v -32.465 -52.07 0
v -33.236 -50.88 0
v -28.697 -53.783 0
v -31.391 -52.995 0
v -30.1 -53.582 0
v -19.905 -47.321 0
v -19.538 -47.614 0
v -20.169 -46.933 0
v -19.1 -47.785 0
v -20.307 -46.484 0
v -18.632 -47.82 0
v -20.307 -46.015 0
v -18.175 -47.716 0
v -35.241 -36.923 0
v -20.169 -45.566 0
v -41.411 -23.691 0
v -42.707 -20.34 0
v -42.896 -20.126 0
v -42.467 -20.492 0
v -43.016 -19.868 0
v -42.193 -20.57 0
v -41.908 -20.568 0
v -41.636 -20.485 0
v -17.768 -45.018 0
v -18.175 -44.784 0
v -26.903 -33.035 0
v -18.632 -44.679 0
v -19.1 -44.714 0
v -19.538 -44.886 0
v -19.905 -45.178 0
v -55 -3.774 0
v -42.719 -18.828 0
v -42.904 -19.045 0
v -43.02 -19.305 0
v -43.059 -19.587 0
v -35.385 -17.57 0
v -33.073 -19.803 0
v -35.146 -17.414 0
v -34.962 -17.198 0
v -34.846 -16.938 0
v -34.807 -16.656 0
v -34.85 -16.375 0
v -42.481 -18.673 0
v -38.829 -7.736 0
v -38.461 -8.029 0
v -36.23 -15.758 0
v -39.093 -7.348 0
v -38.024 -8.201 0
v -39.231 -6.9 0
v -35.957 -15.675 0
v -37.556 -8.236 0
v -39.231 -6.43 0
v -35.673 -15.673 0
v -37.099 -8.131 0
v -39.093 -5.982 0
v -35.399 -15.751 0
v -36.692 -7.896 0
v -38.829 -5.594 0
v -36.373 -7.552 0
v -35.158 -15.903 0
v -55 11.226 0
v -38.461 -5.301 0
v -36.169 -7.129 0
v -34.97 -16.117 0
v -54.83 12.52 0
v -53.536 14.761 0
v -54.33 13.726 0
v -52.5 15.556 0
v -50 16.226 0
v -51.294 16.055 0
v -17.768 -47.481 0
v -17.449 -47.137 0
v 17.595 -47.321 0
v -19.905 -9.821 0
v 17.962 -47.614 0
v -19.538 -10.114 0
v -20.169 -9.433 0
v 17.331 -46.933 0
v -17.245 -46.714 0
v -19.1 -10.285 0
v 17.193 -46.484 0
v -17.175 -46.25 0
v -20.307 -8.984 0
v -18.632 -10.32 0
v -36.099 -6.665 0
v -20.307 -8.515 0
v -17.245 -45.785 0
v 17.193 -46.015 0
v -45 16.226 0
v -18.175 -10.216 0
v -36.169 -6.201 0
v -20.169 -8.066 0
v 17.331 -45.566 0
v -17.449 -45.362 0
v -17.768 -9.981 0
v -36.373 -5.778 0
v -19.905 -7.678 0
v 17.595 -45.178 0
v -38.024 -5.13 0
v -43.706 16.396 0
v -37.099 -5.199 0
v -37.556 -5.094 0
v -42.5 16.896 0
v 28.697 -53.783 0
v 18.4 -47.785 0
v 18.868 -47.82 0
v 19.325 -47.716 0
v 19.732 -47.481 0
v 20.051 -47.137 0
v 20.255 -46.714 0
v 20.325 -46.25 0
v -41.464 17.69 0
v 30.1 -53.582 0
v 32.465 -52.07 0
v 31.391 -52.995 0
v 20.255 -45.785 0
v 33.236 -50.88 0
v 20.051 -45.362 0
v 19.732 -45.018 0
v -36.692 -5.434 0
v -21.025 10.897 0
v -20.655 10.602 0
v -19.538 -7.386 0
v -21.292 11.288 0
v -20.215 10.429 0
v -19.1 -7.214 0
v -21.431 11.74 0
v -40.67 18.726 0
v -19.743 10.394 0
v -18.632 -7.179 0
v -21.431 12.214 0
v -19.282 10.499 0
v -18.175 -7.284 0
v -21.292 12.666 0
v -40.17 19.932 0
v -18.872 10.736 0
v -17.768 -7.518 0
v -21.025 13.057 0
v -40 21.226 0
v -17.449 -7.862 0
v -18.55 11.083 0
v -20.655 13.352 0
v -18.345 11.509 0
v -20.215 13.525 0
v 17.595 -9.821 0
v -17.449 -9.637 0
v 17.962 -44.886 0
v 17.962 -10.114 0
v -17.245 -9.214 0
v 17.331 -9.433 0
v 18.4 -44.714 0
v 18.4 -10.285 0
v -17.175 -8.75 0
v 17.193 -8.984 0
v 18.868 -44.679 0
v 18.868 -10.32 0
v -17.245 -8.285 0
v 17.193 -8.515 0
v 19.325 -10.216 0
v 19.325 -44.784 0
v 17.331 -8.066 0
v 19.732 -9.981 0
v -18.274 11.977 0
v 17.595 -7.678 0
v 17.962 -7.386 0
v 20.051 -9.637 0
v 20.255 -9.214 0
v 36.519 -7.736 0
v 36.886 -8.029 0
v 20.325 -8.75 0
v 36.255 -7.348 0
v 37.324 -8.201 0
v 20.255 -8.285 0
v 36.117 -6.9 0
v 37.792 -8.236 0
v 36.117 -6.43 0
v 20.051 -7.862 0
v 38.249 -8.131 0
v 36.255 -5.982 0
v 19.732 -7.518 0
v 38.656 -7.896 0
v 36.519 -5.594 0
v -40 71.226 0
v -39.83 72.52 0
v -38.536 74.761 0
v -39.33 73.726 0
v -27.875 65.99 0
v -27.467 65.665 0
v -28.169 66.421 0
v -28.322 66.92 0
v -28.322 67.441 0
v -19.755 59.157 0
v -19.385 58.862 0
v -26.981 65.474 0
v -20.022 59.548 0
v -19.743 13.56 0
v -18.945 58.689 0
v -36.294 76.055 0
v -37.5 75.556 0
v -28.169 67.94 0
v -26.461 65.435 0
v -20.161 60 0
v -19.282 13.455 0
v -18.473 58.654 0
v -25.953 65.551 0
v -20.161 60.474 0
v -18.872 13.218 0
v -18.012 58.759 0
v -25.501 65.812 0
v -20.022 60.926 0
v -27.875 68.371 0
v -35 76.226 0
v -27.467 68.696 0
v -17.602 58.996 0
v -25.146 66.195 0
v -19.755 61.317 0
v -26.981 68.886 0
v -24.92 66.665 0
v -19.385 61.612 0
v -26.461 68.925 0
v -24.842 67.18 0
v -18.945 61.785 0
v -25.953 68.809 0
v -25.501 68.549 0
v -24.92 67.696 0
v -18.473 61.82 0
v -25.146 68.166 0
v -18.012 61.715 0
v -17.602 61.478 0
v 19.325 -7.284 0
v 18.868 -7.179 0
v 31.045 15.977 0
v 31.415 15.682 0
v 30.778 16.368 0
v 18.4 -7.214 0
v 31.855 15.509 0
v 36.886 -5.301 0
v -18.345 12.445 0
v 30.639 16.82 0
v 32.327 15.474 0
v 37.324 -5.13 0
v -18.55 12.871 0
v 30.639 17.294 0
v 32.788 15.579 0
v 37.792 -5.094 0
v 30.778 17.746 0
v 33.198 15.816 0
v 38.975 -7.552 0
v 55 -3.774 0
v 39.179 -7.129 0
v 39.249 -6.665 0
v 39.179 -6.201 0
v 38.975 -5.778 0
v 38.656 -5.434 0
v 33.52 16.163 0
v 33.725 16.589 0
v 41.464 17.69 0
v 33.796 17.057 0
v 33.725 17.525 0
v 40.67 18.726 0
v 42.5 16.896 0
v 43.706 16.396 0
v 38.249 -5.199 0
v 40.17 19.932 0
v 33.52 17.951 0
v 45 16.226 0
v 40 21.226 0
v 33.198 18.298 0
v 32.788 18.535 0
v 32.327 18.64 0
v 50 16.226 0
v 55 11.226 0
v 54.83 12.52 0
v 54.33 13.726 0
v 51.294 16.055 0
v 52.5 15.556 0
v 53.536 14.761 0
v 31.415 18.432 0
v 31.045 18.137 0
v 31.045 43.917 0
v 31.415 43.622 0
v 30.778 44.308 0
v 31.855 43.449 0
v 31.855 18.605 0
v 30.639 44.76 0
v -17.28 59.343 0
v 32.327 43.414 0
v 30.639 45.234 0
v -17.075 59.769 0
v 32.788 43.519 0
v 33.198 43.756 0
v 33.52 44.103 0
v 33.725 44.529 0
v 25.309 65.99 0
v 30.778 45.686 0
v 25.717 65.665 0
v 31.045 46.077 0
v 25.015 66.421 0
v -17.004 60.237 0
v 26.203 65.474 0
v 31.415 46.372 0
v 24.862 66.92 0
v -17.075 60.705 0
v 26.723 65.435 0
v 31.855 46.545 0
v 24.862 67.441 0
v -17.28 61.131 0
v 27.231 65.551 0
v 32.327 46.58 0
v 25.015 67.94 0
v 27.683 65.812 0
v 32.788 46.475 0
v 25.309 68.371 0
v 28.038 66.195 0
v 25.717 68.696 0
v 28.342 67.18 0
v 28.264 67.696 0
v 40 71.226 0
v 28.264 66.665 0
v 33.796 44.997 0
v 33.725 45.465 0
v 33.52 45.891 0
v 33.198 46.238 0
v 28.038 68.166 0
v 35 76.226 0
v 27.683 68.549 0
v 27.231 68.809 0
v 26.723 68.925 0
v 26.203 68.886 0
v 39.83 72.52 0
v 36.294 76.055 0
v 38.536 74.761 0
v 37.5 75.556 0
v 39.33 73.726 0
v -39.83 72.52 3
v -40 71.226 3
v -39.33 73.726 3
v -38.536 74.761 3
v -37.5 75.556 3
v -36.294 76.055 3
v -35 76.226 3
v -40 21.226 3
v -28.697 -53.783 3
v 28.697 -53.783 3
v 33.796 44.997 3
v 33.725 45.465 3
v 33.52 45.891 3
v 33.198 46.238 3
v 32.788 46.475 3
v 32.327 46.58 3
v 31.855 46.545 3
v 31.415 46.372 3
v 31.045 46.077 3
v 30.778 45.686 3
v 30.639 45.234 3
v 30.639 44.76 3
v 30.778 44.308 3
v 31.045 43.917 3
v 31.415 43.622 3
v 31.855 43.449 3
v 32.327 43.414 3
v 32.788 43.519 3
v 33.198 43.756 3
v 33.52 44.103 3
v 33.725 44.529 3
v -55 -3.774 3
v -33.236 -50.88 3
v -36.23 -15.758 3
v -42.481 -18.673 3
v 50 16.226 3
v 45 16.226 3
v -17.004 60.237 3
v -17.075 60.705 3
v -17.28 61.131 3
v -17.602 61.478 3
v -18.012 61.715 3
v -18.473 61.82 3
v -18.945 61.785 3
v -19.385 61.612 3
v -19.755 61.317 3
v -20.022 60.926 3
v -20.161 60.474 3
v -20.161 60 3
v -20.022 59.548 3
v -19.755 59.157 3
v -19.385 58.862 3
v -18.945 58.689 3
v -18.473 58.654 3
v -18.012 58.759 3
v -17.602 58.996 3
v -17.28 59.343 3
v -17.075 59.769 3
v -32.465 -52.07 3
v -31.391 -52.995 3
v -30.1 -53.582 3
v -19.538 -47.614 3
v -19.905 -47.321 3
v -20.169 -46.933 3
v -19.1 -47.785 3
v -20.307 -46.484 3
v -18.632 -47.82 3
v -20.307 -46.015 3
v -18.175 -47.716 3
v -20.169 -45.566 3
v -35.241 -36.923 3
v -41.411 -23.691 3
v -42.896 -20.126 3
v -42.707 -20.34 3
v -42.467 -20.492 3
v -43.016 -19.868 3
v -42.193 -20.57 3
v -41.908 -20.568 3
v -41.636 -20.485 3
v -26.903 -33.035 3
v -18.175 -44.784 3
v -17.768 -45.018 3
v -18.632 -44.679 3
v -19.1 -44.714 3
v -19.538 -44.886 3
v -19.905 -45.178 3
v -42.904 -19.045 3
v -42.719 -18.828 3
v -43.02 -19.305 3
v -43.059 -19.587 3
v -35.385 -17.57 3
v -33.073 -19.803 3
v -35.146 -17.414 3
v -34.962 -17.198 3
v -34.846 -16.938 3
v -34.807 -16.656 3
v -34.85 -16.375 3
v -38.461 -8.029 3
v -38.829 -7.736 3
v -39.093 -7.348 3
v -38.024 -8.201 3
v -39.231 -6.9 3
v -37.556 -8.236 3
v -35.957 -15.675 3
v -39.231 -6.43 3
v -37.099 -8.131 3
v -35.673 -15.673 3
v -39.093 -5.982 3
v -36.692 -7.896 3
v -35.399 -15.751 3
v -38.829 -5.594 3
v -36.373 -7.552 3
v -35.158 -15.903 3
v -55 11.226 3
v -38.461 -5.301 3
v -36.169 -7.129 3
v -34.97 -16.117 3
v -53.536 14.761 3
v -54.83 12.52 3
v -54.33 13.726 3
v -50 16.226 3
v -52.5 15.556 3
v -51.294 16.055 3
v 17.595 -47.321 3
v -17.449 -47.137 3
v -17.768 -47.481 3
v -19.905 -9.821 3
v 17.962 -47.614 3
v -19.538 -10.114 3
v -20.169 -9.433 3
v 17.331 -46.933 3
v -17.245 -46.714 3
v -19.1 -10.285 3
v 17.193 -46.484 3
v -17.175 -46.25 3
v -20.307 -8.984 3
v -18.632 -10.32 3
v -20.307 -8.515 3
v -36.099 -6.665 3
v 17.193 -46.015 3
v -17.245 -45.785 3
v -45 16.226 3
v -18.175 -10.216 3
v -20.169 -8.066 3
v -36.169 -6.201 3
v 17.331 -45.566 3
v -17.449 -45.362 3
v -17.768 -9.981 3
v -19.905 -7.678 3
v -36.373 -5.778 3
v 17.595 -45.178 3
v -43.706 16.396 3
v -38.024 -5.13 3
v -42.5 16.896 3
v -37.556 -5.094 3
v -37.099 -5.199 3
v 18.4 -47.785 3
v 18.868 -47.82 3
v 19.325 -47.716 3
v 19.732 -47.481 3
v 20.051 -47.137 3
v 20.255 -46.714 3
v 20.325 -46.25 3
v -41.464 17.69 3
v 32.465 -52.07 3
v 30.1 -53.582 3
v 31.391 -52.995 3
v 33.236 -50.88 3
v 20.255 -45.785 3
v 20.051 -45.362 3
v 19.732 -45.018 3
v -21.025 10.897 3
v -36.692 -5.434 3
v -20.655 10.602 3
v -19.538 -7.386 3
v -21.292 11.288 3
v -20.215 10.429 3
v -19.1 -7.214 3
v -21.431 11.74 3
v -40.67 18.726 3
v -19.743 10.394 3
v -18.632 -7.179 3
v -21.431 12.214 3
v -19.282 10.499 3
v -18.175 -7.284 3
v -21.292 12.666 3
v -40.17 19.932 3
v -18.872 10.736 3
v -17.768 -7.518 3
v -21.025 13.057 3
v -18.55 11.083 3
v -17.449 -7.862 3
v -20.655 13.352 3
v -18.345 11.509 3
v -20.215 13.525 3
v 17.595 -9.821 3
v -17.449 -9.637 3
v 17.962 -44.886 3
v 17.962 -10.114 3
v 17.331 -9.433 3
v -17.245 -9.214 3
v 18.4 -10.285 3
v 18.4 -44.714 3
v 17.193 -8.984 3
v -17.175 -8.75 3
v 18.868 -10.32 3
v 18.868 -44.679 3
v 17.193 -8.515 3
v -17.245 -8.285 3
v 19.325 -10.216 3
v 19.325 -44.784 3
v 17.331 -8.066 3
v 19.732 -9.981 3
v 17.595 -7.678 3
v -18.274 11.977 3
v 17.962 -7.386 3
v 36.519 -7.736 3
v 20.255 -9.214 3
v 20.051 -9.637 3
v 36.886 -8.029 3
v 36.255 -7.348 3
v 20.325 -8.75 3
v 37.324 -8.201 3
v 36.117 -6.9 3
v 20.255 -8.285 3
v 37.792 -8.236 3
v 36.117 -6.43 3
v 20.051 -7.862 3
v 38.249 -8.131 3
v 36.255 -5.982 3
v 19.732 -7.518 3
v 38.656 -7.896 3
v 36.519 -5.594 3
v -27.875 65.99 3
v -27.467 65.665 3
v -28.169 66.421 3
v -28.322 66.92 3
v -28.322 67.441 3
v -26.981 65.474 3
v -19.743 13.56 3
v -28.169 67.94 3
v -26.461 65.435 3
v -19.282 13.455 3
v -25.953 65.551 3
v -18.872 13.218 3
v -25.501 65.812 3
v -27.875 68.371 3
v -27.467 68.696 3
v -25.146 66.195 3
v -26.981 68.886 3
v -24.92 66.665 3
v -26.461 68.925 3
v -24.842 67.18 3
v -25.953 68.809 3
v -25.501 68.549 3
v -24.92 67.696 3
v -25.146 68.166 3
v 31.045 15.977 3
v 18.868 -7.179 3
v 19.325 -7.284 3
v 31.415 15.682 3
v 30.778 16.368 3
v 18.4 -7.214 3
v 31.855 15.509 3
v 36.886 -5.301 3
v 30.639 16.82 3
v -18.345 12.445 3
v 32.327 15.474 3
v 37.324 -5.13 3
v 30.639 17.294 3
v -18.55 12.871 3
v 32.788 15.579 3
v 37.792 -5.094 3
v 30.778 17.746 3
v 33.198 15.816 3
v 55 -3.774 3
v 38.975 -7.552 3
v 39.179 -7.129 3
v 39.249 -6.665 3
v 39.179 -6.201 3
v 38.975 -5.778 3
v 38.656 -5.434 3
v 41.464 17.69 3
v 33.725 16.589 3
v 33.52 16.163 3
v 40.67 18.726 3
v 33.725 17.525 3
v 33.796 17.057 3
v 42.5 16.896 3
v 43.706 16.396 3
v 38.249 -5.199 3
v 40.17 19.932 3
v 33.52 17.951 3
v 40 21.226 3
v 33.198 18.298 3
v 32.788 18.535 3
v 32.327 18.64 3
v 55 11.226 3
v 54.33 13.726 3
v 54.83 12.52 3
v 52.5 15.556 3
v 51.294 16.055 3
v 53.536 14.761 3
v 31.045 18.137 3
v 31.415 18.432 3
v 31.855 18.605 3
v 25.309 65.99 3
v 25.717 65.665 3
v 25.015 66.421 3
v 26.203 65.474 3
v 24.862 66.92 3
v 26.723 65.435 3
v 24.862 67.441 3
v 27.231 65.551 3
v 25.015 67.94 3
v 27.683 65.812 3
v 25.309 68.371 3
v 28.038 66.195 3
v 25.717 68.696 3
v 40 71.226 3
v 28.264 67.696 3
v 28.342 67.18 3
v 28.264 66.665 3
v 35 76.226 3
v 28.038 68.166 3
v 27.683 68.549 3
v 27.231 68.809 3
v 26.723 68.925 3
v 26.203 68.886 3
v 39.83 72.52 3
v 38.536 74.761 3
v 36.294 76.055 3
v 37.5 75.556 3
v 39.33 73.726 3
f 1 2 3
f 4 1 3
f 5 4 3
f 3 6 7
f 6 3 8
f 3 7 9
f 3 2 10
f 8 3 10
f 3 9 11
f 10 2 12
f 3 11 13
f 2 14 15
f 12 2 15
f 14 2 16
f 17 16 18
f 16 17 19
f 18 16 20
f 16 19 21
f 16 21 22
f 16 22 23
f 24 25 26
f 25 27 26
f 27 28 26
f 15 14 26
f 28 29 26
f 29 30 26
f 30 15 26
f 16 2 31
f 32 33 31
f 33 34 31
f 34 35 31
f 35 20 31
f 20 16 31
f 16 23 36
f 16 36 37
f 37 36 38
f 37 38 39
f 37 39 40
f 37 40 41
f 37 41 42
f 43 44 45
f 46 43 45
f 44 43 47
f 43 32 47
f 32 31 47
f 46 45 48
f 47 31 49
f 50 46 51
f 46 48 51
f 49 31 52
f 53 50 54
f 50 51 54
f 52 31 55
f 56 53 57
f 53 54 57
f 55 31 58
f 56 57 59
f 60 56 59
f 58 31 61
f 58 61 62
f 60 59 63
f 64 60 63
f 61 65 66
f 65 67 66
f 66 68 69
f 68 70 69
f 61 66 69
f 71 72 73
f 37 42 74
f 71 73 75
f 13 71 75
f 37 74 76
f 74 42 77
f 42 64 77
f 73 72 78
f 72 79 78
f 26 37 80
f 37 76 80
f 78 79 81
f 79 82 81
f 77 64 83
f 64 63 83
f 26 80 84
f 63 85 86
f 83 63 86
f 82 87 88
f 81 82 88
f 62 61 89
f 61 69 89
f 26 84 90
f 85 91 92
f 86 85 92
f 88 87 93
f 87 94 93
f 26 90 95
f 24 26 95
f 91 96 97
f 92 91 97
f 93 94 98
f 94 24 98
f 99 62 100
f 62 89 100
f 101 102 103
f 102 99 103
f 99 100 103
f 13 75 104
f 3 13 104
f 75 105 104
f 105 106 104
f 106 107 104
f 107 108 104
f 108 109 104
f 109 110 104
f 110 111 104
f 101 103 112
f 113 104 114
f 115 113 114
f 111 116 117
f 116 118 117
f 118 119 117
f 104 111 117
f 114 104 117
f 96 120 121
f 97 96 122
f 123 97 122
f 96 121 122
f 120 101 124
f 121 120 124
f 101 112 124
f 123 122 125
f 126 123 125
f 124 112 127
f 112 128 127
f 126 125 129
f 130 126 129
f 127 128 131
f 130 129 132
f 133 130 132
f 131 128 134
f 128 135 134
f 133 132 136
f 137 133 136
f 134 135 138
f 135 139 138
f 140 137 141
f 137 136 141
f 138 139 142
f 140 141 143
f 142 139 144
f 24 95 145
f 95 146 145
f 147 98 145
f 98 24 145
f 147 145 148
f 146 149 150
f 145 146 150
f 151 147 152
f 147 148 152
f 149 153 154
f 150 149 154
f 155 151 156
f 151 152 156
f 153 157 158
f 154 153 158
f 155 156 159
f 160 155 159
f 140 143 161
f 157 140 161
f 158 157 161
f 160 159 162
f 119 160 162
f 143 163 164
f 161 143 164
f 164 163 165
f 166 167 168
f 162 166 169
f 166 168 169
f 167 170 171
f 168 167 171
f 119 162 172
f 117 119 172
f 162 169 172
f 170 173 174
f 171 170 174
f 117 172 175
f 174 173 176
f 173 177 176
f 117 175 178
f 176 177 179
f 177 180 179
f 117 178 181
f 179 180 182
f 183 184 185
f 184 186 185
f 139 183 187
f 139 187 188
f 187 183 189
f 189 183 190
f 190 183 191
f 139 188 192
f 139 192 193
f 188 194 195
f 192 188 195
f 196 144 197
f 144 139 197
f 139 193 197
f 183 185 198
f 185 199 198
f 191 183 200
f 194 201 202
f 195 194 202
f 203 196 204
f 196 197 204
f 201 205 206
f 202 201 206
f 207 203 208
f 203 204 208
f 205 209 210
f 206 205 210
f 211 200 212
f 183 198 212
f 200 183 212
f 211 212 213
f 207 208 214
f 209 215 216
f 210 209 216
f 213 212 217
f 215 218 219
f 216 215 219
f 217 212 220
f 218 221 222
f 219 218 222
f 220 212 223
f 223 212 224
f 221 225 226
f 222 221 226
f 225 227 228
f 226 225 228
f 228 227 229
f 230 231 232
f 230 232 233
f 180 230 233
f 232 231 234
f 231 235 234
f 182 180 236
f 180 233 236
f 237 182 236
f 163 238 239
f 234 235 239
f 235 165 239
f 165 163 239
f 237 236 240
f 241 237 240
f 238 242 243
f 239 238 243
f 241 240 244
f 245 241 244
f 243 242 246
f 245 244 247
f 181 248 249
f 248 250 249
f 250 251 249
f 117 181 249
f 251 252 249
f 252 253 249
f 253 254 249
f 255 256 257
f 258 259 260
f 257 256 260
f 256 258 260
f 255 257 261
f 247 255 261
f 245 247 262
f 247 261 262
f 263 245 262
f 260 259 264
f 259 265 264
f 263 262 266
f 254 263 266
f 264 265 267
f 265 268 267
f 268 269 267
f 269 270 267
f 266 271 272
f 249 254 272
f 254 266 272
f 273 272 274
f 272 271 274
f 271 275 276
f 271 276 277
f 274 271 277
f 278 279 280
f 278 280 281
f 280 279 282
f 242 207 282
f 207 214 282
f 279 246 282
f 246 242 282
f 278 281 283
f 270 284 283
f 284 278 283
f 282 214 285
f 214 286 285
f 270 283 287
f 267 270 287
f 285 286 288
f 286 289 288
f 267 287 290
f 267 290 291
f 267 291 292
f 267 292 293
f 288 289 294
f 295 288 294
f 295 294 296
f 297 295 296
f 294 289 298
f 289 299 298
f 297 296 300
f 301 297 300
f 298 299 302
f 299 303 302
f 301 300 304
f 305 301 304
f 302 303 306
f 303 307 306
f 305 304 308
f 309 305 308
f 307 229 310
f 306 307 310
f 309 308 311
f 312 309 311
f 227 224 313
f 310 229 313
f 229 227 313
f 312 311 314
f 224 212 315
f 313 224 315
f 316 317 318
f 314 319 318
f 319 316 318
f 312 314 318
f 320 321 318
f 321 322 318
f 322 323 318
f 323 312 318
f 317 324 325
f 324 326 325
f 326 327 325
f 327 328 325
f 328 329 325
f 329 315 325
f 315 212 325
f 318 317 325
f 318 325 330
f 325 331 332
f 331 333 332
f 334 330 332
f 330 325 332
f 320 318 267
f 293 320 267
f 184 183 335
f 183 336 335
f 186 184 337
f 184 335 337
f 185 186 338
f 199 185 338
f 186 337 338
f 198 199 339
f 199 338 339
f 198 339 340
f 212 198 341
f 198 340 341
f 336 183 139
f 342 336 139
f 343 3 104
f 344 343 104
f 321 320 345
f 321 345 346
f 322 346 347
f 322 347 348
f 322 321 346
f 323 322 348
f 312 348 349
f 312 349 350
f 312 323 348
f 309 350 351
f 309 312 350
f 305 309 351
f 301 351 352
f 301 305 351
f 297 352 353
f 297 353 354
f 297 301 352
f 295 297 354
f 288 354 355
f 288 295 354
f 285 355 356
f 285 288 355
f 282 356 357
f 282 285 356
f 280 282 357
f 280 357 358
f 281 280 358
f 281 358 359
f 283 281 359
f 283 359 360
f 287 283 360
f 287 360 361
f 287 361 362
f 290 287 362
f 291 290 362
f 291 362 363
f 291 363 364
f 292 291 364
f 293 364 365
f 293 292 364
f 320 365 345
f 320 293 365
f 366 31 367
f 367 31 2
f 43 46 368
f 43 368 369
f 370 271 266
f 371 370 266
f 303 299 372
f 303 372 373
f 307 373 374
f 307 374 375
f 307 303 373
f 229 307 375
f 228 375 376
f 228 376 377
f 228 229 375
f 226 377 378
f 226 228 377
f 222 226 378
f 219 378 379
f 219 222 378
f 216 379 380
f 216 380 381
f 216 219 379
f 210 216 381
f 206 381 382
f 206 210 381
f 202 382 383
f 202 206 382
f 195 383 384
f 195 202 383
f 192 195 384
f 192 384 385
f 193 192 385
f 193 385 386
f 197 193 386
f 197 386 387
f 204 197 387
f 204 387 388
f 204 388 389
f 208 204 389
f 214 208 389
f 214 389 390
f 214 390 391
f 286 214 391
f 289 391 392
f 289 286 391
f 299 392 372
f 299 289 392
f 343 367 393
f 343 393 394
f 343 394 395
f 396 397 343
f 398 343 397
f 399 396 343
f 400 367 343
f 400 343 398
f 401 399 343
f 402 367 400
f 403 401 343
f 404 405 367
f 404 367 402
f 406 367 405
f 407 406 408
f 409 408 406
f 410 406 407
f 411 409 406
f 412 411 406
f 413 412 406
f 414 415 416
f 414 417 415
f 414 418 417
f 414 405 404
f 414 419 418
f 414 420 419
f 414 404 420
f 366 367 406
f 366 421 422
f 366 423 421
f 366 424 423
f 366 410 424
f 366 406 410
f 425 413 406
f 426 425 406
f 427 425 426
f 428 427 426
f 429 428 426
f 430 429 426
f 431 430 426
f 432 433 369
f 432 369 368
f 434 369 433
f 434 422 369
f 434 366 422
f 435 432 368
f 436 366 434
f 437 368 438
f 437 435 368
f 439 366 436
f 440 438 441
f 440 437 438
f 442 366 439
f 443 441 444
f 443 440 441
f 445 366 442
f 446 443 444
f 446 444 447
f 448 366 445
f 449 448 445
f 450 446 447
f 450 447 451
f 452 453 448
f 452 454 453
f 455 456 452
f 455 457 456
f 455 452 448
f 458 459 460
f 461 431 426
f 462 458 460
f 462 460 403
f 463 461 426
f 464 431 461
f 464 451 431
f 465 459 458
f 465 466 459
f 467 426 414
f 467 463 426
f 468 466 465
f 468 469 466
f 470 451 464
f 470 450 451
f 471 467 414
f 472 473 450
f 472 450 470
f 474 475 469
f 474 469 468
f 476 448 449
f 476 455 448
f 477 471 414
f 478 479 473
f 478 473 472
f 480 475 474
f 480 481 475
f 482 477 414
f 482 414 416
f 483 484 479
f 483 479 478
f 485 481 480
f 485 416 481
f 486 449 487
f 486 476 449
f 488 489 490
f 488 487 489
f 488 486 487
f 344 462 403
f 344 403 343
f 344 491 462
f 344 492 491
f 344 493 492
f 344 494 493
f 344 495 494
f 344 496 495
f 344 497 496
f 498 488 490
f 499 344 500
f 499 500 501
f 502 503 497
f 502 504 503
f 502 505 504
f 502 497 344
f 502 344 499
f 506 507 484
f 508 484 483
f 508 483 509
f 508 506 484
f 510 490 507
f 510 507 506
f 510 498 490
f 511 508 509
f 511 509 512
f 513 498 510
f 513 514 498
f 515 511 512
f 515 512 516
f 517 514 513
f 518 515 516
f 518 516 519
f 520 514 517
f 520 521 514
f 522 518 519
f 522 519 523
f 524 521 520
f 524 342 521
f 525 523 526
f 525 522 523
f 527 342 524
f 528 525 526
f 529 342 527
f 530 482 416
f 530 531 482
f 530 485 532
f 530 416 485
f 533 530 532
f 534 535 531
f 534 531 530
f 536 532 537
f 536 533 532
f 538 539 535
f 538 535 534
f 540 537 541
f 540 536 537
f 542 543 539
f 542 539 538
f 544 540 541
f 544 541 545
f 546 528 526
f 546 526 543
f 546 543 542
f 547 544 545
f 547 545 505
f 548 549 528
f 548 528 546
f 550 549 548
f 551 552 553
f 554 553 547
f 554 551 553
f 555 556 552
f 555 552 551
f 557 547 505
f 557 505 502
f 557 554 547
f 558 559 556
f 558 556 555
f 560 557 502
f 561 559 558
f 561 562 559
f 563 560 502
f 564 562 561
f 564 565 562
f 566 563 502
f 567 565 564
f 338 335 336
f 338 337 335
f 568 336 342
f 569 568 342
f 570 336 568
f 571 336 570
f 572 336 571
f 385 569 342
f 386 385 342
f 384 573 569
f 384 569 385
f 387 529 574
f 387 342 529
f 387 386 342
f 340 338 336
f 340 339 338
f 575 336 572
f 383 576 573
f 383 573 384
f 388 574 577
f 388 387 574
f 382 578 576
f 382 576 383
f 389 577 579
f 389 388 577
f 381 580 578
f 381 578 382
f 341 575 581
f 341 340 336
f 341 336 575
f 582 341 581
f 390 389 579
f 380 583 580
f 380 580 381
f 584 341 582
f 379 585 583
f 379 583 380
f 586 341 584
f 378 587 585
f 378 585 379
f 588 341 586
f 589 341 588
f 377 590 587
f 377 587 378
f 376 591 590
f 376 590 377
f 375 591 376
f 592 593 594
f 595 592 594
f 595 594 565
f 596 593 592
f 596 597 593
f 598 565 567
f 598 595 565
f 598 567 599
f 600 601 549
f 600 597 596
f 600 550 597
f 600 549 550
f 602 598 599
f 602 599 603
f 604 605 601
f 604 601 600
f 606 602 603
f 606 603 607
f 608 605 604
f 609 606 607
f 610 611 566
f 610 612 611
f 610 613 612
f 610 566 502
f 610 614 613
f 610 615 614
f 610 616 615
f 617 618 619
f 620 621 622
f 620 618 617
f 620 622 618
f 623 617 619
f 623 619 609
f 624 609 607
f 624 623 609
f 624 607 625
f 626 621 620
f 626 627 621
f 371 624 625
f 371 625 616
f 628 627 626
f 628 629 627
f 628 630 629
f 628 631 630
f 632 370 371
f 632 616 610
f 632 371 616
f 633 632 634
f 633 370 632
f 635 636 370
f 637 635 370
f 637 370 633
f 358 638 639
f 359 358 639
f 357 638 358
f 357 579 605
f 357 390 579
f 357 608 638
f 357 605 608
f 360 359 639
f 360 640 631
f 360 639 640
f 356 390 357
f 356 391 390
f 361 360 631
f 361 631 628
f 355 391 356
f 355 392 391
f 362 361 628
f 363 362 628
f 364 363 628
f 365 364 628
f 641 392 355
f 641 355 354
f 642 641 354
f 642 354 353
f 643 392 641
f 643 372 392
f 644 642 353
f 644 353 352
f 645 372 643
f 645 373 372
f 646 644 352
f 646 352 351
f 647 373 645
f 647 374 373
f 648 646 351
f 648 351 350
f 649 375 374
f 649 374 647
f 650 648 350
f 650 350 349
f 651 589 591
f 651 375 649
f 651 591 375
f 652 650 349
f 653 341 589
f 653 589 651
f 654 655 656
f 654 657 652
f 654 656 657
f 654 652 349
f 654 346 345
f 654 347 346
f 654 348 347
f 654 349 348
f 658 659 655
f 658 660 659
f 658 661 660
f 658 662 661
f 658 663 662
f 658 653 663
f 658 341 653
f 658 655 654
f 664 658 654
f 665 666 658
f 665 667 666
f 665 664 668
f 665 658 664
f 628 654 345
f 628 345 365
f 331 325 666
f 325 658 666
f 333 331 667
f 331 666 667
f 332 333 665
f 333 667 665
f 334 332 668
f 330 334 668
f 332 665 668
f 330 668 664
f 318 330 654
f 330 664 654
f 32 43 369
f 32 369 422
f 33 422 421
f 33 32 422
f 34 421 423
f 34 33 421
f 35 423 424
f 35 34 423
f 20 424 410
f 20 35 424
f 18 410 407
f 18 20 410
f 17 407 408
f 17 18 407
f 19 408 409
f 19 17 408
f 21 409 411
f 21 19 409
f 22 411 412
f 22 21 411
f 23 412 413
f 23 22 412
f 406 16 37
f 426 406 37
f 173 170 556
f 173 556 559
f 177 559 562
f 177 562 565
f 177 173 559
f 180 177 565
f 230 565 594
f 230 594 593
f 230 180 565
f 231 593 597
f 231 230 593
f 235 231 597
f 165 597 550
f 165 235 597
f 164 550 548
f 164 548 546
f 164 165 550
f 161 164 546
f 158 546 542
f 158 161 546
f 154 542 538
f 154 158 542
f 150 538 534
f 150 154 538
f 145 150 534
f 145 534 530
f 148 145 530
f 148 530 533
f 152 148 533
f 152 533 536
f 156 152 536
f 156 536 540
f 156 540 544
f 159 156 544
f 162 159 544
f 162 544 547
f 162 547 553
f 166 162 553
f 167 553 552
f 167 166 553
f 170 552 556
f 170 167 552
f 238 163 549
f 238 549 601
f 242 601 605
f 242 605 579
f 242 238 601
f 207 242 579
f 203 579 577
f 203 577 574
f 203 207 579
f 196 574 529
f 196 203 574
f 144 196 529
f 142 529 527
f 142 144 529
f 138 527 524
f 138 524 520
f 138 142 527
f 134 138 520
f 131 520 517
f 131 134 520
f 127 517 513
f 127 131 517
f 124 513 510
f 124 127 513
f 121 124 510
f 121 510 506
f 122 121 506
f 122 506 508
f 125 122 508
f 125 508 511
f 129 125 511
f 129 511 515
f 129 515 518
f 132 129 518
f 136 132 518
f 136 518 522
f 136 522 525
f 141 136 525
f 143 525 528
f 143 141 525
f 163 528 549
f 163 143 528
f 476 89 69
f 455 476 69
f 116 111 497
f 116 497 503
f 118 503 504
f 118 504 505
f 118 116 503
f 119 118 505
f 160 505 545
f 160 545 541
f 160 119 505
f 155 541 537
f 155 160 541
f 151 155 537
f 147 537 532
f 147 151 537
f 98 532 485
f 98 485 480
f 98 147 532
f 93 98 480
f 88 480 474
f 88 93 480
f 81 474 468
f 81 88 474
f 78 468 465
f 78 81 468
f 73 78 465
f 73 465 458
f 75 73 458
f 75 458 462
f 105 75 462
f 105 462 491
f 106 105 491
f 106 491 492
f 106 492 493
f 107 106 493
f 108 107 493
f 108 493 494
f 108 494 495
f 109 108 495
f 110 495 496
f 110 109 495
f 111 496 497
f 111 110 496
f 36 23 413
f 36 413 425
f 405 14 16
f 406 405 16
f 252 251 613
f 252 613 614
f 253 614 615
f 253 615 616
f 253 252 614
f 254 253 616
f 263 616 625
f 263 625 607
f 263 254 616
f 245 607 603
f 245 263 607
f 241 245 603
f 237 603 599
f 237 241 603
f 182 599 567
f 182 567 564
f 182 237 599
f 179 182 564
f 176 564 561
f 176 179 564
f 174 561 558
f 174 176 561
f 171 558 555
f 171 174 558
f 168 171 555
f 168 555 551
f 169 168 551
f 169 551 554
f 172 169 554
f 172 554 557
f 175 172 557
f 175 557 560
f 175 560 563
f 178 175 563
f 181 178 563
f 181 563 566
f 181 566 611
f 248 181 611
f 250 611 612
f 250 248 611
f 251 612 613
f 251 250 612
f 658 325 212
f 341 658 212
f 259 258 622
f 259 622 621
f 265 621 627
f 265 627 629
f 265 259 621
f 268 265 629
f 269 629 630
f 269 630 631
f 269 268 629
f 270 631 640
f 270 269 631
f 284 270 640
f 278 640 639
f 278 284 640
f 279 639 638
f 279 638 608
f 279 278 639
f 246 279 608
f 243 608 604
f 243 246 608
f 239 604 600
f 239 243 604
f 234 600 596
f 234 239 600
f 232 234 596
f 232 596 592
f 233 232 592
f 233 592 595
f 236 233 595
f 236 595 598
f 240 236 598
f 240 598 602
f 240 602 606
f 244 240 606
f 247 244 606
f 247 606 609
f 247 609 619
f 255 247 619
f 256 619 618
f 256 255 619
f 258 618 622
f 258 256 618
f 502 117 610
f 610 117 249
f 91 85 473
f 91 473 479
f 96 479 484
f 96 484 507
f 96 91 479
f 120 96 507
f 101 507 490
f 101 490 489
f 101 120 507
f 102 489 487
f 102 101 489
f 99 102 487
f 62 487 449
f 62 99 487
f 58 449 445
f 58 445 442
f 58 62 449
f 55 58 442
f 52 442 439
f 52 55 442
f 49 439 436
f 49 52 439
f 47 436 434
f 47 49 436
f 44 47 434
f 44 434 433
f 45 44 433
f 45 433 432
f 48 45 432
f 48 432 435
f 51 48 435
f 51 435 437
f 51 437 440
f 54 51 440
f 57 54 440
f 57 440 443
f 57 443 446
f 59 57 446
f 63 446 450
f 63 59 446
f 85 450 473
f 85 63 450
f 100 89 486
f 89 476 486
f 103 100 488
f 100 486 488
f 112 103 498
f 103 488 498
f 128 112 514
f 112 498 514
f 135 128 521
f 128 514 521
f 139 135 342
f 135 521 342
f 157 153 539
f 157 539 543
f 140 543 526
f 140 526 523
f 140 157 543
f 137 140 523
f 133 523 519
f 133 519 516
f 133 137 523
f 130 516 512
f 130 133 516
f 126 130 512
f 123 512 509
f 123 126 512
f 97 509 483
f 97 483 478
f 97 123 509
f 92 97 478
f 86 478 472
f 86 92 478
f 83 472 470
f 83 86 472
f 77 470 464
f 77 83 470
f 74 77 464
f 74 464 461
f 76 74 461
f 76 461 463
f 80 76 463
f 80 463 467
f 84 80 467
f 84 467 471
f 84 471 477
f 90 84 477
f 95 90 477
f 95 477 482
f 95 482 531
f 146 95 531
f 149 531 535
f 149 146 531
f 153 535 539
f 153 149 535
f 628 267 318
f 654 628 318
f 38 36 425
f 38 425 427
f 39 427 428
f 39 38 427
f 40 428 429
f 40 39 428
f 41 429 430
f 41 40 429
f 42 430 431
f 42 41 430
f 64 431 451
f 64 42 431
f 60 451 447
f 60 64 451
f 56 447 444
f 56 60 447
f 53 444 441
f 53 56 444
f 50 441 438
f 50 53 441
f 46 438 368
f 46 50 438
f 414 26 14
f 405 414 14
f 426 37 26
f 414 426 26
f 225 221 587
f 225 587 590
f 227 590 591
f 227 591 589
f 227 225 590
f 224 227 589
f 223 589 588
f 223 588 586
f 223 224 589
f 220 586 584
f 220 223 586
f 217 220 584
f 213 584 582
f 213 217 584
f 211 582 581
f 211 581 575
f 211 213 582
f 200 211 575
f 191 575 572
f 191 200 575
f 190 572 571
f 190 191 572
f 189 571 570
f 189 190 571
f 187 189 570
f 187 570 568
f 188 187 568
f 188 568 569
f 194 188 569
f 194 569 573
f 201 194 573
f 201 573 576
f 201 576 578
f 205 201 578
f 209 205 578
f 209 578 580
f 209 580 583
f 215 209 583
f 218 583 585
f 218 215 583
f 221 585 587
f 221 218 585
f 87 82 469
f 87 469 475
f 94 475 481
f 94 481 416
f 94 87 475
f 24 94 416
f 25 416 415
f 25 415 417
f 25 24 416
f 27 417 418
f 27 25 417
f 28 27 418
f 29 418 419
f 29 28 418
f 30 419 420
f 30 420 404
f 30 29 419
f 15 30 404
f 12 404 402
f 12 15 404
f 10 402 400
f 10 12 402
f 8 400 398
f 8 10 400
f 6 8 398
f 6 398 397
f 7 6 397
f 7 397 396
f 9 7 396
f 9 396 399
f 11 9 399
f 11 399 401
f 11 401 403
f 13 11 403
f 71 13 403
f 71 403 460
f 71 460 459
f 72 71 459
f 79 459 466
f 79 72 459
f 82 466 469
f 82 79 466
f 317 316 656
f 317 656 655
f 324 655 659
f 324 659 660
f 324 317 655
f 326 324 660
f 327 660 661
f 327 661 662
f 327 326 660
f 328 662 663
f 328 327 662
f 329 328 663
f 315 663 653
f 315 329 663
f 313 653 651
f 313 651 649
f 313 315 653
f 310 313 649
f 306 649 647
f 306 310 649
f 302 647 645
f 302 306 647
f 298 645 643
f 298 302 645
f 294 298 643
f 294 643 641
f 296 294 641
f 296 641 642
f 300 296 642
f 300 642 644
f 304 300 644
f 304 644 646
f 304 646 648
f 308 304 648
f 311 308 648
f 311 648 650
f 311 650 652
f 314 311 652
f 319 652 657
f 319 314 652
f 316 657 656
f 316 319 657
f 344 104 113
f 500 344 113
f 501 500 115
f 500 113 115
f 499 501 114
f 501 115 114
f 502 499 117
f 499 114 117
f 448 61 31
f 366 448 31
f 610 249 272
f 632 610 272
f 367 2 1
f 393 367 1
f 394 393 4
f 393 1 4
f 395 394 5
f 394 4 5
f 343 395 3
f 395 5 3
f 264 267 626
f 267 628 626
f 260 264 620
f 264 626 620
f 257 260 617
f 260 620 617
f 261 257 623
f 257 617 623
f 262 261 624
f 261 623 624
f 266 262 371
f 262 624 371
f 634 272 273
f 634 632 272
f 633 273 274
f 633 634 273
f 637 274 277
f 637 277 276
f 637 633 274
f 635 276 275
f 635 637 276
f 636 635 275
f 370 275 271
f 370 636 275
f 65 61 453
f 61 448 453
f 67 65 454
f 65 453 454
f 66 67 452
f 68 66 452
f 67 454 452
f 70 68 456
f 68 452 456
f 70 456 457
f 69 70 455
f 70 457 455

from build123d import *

# Parameters (mm, degrees)
SKETCH1_R           = 1.575
SKETCH1_R_2         = 1.5875
SKETCH1_R_3         = 1.75
BOSS_EXTRUDE1_DEPTH = 3
FILLET1_R           = 5


with BuildPart() as part:
    # Sketch1 → Boss-Extrude1 (new body)
    with BuildSketch(Plane.XY):
        with BuildLine():
            Line((-55, -3.774250665), (-33.235815946, -50.880076598))
            ThreePointArc((-33.235815946, -50.880076598), (-31.390782754, -52.995176633), (-28.696863862, -53.782956197))
            Line((-28.696863862, -53.782956197), (28.696863862, -53.782956197))
            ThreePointArc((28.696863862, -53.782956197), (31.390782754, -52.995176633), (33.235815946, -50.880076598))
            Line((33.235815946, -50.880076598), (55, -3.774250665))
            Line((55, -3.774250665), (55, 16.225749335))
            Line((55, 16.225749335), (40, 16.225749335))
            Line((40, 16.225749335), (40, 76.225749335))
            Line((40, 76.225749335), (-40, 76.225749335))
            Line((-40, 76.225749335), (-40, 16.225749335))
            Line((-40, 16.225749335), (-55, 16.225749335))
            Line((-55, 16.225749335), (-55, -3.774250665))
        make_face()
        with Locations((-37.673971089, -6.665090314)):
            Circle(SKETCH1_R, mode=Mode.SUBTRACT)
        with Locations((37.673971089, -6.665090314)):
            Circle(SKETCH1_R, mode=Mode.SUBTRACT)
        with Locations((32.208377558, 17.056918669)):
            Circle(SKETCH1_R_2, mode=Mode.SUBTRACT)
        with Locations((32.208377558, 44.996918669)):
            Circle(SKETCH1_R_2, mode=Mode.SUBTRACT)
        with Locations((-19.861622442, 11.976918669)):
            Circle(SKETCH1_R_2, mode=Mode.SUBTRACT)
        with Locations((-18.591622442, 60.236918669)):
            Circle(SKETCH1_R_2, mode=Mode.SUBTRACT)
        with Locations((-26.592001418, 67.180357374)):
            Circle(SKETCH1_R_3, mode=Mode.SUBTRACT)
        with Locations((26.592001418, 67.180357374)):
            Circle(SKETCH1_R_3, mode=Mode.SUBTRACT)
        with Locations((-18.75, -8.749633405)):
            Circle(SKETCH1_R, mode=Mode.SUBTRACT)
        with Locations((18.75, -8.749633405)):
            Circle(SKETCH1_R, mode=Mode.SUBTRACT)
        with Locations((-18.75, -46.249633405)):
            Circle(SKETCH1_R, mode=Mode.SUBTRACT)
        with Locations((18.75, -46.249633405)):
            Circle(SKETCH1_R, mode=Mode.SUBTRACT)
        Polygon((-41.411487692, -23.690735407), (-33.073456052, -19.802647399), (-26.90322943, -33.03474109), (-35.241261071, -36.922829098), align=None, mode=Mode.SUBTRACT)
        with BuildLine():
            Line((-41.63599241, -20.485289919), (-35.384660905, -17.570246165))
            ThreePointArc((-35.384660905, -17.570246165), (-34.90097138, -16.241320116), (-36.229897428, -15.757630591))
            Line((-36.229897428, -15.757630591), (-42.481228933, -18.672674345))
            ThreePointArc((-42.481228933, -18.672674345), (-42.964918459, -20.001600394), (-41.63599241, -20.485289919))
        make_face(mode=Mode.SUBTRACT)
    extrude(amount=BOSS_EXTRUDE1_DEPTH)

    # Fillet1
    fillet1_edges = [part.edges().sort_by_distance(p)[0] for p in [
        (-55, 16.225749335, 1.5),
        (-40, 16.225749335, 1.5),
        (-40, 76.225749335, 1.5),
        (40, 76.225749335, 1.5),
        (40, 16.225749335, 1.5),
        (55, 16.225749335, 1.5),
    ]]
    fillet(fillet1_edges, radius=FILLET1_R)


solid = part.part
